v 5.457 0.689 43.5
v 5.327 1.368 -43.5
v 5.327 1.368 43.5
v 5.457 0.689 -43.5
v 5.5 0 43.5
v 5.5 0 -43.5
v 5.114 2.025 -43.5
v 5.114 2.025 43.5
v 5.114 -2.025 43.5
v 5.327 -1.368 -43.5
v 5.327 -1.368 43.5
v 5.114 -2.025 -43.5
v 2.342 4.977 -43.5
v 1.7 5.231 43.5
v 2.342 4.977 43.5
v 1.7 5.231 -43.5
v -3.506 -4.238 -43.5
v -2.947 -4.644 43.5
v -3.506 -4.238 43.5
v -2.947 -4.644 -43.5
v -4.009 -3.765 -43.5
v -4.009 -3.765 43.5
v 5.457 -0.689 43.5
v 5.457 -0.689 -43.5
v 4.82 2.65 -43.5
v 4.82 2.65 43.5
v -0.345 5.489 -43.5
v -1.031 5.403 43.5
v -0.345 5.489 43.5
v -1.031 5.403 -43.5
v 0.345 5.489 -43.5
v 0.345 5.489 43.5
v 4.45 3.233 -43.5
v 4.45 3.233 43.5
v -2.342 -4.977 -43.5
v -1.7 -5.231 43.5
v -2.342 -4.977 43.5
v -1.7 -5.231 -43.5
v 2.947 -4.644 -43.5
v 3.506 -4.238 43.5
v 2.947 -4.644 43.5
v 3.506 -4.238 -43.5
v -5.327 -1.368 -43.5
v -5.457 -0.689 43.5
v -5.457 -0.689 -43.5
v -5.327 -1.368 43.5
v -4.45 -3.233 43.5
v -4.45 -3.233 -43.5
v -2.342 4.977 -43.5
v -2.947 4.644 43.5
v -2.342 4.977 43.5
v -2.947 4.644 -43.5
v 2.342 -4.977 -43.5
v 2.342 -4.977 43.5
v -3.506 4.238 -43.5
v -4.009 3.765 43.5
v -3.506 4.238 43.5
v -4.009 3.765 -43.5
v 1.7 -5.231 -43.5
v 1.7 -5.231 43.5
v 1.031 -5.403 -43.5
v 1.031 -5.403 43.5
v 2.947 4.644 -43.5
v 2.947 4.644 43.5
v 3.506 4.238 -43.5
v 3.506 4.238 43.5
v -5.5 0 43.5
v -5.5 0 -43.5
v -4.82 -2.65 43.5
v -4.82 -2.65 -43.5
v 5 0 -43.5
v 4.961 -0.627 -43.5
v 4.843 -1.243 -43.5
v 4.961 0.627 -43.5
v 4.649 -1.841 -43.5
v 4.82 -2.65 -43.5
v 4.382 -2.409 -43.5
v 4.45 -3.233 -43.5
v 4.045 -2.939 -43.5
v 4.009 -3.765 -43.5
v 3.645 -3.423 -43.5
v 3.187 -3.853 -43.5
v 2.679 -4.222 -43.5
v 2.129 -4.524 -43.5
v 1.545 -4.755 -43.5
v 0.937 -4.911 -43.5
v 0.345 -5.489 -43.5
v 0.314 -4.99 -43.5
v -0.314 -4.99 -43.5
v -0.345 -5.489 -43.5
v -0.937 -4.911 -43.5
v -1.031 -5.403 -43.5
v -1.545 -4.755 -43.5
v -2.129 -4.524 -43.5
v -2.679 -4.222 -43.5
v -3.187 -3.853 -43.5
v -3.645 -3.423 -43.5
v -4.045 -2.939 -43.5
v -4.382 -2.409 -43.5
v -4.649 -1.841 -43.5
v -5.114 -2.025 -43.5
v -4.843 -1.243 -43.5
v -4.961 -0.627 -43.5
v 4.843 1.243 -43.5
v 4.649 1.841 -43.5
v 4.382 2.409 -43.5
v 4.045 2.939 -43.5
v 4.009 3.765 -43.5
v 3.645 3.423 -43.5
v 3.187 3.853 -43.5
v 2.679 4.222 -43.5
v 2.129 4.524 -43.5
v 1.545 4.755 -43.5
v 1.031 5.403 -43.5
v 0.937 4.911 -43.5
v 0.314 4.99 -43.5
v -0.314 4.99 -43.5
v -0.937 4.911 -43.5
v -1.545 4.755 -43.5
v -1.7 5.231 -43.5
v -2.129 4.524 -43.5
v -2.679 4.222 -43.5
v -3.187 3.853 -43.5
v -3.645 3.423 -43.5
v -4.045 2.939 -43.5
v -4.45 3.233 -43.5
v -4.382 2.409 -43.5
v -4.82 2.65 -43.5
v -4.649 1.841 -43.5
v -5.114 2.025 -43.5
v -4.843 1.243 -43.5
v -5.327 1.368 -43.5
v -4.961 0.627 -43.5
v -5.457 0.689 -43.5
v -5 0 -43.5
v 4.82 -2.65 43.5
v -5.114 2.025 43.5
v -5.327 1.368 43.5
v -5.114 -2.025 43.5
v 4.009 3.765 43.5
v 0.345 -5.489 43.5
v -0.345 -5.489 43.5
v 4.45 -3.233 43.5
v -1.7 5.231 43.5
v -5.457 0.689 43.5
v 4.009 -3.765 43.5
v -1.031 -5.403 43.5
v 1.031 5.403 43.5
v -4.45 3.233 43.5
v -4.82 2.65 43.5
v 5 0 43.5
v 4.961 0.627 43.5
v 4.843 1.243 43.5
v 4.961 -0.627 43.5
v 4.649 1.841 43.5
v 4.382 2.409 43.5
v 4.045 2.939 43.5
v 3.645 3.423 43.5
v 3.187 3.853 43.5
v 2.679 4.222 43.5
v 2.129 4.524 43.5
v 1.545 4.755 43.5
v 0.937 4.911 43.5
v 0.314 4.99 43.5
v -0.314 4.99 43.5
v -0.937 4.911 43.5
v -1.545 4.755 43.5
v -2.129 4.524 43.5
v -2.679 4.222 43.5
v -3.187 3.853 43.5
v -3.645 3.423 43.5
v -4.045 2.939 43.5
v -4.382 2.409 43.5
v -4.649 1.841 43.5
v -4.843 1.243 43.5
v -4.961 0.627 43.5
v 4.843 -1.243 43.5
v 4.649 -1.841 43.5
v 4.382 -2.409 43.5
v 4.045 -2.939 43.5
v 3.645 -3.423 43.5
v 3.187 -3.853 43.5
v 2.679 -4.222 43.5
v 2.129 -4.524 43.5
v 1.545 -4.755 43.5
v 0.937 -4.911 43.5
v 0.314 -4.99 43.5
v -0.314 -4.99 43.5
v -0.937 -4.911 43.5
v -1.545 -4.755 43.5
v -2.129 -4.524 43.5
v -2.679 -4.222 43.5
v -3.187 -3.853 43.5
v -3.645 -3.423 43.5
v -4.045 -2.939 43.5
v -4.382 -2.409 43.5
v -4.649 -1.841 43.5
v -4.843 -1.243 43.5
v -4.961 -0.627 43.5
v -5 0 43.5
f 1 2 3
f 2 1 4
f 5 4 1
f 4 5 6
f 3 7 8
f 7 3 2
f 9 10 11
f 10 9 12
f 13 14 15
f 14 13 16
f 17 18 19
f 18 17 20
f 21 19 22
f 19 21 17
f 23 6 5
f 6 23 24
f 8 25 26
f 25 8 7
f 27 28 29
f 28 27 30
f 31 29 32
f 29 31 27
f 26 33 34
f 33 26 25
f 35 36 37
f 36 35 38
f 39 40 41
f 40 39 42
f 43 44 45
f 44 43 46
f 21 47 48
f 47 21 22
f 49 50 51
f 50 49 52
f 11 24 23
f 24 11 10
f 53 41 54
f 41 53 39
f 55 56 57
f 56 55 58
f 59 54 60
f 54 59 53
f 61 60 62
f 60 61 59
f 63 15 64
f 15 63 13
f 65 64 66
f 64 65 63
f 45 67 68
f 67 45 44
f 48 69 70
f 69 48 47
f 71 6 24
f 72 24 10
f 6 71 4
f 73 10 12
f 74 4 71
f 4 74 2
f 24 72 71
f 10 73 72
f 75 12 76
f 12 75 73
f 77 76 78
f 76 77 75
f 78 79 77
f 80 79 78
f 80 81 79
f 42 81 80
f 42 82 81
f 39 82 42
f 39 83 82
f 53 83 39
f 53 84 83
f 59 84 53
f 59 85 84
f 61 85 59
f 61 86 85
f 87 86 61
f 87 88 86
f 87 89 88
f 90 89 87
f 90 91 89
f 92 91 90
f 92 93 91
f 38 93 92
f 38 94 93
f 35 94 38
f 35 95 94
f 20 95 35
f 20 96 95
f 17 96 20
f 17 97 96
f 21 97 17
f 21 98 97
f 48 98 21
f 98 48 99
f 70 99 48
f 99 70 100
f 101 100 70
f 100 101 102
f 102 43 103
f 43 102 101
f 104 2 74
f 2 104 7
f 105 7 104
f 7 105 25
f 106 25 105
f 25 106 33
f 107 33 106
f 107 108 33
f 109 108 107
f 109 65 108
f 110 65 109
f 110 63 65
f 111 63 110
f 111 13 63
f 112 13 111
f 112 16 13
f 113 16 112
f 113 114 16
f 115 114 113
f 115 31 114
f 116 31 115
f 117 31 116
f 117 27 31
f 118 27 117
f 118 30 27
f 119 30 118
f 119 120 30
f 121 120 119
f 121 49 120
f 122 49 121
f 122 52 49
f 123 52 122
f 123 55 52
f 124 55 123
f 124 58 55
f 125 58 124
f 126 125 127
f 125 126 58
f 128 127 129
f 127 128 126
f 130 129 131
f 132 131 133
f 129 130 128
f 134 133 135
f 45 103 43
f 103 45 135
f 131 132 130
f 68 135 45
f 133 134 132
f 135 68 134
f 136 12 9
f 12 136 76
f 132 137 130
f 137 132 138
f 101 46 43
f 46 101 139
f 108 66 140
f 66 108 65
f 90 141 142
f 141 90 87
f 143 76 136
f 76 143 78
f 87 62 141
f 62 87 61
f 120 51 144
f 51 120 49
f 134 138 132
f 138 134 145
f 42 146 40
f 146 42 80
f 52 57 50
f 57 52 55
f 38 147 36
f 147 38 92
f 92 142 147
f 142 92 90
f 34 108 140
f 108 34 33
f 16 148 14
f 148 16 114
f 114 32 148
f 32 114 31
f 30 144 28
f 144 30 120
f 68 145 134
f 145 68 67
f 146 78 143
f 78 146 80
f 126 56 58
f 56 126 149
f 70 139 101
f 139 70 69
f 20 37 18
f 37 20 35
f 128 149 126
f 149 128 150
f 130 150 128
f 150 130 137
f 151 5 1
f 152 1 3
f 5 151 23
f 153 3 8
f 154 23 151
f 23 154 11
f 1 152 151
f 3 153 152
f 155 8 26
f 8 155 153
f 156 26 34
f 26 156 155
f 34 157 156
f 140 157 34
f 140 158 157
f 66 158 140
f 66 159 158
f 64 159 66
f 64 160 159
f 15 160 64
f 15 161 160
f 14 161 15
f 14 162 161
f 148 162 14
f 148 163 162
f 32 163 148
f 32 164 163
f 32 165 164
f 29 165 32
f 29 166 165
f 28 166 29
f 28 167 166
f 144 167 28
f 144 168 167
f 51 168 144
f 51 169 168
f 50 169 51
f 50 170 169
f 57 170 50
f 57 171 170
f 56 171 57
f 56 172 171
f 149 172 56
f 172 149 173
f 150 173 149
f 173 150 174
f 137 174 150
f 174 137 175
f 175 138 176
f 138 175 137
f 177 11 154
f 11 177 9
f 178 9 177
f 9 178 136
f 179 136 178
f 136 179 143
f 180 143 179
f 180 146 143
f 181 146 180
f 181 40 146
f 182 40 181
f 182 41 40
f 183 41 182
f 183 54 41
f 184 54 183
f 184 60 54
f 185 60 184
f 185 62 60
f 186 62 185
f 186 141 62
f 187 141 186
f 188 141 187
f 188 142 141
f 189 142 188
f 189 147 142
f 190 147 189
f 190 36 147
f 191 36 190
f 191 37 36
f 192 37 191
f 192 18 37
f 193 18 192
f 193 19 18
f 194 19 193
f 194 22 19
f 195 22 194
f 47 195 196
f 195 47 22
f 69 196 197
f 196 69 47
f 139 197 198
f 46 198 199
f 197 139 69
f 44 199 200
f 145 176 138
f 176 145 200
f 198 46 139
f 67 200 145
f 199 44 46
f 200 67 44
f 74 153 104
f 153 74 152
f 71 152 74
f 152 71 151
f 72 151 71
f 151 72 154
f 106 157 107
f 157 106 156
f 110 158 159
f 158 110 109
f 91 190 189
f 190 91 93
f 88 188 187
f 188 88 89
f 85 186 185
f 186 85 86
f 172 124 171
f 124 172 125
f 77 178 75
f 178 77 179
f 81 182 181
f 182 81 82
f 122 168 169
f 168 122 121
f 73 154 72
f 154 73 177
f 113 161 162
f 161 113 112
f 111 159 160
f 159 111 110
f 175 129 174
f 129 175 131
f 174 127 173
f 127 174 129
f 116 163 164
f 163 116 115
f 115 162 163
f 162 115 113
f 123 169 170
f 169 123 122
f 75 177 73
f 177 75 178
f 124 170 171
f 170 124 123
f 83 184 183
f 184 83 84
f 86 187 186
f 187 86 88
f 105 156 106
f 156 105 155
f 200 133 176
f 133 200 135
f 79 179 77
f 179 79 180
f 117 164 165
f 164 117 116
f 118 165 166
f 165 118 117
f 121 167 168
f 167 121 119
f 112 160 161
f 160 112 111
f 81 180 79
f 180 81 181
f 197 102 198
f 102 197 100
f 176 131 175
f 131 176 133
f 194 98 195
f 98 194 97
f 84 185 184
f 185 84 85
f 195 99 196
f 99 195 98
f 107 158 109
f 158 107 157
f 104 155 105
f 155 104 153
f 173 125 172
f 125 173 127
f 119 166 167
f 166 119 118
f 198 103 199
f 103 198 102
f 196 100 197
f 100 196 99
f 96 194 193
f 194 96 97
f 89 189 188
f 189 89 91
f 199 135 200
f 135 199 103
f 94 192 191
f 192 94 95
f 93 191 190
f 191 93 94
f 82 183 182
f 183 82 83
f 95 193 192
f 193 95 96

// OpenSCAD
$fn = 50;


difference() {
	union() {
		translate(v = [0, 0, -43.5000000000]) {
			cylinder(h = 87, r = 5.5000000000);
		}
	}
	union() {
		translate(v = [0, 0, -100.0000000000]) {
			cylinder(h = 200, r = 5.0000000000);
		}
	}
}
